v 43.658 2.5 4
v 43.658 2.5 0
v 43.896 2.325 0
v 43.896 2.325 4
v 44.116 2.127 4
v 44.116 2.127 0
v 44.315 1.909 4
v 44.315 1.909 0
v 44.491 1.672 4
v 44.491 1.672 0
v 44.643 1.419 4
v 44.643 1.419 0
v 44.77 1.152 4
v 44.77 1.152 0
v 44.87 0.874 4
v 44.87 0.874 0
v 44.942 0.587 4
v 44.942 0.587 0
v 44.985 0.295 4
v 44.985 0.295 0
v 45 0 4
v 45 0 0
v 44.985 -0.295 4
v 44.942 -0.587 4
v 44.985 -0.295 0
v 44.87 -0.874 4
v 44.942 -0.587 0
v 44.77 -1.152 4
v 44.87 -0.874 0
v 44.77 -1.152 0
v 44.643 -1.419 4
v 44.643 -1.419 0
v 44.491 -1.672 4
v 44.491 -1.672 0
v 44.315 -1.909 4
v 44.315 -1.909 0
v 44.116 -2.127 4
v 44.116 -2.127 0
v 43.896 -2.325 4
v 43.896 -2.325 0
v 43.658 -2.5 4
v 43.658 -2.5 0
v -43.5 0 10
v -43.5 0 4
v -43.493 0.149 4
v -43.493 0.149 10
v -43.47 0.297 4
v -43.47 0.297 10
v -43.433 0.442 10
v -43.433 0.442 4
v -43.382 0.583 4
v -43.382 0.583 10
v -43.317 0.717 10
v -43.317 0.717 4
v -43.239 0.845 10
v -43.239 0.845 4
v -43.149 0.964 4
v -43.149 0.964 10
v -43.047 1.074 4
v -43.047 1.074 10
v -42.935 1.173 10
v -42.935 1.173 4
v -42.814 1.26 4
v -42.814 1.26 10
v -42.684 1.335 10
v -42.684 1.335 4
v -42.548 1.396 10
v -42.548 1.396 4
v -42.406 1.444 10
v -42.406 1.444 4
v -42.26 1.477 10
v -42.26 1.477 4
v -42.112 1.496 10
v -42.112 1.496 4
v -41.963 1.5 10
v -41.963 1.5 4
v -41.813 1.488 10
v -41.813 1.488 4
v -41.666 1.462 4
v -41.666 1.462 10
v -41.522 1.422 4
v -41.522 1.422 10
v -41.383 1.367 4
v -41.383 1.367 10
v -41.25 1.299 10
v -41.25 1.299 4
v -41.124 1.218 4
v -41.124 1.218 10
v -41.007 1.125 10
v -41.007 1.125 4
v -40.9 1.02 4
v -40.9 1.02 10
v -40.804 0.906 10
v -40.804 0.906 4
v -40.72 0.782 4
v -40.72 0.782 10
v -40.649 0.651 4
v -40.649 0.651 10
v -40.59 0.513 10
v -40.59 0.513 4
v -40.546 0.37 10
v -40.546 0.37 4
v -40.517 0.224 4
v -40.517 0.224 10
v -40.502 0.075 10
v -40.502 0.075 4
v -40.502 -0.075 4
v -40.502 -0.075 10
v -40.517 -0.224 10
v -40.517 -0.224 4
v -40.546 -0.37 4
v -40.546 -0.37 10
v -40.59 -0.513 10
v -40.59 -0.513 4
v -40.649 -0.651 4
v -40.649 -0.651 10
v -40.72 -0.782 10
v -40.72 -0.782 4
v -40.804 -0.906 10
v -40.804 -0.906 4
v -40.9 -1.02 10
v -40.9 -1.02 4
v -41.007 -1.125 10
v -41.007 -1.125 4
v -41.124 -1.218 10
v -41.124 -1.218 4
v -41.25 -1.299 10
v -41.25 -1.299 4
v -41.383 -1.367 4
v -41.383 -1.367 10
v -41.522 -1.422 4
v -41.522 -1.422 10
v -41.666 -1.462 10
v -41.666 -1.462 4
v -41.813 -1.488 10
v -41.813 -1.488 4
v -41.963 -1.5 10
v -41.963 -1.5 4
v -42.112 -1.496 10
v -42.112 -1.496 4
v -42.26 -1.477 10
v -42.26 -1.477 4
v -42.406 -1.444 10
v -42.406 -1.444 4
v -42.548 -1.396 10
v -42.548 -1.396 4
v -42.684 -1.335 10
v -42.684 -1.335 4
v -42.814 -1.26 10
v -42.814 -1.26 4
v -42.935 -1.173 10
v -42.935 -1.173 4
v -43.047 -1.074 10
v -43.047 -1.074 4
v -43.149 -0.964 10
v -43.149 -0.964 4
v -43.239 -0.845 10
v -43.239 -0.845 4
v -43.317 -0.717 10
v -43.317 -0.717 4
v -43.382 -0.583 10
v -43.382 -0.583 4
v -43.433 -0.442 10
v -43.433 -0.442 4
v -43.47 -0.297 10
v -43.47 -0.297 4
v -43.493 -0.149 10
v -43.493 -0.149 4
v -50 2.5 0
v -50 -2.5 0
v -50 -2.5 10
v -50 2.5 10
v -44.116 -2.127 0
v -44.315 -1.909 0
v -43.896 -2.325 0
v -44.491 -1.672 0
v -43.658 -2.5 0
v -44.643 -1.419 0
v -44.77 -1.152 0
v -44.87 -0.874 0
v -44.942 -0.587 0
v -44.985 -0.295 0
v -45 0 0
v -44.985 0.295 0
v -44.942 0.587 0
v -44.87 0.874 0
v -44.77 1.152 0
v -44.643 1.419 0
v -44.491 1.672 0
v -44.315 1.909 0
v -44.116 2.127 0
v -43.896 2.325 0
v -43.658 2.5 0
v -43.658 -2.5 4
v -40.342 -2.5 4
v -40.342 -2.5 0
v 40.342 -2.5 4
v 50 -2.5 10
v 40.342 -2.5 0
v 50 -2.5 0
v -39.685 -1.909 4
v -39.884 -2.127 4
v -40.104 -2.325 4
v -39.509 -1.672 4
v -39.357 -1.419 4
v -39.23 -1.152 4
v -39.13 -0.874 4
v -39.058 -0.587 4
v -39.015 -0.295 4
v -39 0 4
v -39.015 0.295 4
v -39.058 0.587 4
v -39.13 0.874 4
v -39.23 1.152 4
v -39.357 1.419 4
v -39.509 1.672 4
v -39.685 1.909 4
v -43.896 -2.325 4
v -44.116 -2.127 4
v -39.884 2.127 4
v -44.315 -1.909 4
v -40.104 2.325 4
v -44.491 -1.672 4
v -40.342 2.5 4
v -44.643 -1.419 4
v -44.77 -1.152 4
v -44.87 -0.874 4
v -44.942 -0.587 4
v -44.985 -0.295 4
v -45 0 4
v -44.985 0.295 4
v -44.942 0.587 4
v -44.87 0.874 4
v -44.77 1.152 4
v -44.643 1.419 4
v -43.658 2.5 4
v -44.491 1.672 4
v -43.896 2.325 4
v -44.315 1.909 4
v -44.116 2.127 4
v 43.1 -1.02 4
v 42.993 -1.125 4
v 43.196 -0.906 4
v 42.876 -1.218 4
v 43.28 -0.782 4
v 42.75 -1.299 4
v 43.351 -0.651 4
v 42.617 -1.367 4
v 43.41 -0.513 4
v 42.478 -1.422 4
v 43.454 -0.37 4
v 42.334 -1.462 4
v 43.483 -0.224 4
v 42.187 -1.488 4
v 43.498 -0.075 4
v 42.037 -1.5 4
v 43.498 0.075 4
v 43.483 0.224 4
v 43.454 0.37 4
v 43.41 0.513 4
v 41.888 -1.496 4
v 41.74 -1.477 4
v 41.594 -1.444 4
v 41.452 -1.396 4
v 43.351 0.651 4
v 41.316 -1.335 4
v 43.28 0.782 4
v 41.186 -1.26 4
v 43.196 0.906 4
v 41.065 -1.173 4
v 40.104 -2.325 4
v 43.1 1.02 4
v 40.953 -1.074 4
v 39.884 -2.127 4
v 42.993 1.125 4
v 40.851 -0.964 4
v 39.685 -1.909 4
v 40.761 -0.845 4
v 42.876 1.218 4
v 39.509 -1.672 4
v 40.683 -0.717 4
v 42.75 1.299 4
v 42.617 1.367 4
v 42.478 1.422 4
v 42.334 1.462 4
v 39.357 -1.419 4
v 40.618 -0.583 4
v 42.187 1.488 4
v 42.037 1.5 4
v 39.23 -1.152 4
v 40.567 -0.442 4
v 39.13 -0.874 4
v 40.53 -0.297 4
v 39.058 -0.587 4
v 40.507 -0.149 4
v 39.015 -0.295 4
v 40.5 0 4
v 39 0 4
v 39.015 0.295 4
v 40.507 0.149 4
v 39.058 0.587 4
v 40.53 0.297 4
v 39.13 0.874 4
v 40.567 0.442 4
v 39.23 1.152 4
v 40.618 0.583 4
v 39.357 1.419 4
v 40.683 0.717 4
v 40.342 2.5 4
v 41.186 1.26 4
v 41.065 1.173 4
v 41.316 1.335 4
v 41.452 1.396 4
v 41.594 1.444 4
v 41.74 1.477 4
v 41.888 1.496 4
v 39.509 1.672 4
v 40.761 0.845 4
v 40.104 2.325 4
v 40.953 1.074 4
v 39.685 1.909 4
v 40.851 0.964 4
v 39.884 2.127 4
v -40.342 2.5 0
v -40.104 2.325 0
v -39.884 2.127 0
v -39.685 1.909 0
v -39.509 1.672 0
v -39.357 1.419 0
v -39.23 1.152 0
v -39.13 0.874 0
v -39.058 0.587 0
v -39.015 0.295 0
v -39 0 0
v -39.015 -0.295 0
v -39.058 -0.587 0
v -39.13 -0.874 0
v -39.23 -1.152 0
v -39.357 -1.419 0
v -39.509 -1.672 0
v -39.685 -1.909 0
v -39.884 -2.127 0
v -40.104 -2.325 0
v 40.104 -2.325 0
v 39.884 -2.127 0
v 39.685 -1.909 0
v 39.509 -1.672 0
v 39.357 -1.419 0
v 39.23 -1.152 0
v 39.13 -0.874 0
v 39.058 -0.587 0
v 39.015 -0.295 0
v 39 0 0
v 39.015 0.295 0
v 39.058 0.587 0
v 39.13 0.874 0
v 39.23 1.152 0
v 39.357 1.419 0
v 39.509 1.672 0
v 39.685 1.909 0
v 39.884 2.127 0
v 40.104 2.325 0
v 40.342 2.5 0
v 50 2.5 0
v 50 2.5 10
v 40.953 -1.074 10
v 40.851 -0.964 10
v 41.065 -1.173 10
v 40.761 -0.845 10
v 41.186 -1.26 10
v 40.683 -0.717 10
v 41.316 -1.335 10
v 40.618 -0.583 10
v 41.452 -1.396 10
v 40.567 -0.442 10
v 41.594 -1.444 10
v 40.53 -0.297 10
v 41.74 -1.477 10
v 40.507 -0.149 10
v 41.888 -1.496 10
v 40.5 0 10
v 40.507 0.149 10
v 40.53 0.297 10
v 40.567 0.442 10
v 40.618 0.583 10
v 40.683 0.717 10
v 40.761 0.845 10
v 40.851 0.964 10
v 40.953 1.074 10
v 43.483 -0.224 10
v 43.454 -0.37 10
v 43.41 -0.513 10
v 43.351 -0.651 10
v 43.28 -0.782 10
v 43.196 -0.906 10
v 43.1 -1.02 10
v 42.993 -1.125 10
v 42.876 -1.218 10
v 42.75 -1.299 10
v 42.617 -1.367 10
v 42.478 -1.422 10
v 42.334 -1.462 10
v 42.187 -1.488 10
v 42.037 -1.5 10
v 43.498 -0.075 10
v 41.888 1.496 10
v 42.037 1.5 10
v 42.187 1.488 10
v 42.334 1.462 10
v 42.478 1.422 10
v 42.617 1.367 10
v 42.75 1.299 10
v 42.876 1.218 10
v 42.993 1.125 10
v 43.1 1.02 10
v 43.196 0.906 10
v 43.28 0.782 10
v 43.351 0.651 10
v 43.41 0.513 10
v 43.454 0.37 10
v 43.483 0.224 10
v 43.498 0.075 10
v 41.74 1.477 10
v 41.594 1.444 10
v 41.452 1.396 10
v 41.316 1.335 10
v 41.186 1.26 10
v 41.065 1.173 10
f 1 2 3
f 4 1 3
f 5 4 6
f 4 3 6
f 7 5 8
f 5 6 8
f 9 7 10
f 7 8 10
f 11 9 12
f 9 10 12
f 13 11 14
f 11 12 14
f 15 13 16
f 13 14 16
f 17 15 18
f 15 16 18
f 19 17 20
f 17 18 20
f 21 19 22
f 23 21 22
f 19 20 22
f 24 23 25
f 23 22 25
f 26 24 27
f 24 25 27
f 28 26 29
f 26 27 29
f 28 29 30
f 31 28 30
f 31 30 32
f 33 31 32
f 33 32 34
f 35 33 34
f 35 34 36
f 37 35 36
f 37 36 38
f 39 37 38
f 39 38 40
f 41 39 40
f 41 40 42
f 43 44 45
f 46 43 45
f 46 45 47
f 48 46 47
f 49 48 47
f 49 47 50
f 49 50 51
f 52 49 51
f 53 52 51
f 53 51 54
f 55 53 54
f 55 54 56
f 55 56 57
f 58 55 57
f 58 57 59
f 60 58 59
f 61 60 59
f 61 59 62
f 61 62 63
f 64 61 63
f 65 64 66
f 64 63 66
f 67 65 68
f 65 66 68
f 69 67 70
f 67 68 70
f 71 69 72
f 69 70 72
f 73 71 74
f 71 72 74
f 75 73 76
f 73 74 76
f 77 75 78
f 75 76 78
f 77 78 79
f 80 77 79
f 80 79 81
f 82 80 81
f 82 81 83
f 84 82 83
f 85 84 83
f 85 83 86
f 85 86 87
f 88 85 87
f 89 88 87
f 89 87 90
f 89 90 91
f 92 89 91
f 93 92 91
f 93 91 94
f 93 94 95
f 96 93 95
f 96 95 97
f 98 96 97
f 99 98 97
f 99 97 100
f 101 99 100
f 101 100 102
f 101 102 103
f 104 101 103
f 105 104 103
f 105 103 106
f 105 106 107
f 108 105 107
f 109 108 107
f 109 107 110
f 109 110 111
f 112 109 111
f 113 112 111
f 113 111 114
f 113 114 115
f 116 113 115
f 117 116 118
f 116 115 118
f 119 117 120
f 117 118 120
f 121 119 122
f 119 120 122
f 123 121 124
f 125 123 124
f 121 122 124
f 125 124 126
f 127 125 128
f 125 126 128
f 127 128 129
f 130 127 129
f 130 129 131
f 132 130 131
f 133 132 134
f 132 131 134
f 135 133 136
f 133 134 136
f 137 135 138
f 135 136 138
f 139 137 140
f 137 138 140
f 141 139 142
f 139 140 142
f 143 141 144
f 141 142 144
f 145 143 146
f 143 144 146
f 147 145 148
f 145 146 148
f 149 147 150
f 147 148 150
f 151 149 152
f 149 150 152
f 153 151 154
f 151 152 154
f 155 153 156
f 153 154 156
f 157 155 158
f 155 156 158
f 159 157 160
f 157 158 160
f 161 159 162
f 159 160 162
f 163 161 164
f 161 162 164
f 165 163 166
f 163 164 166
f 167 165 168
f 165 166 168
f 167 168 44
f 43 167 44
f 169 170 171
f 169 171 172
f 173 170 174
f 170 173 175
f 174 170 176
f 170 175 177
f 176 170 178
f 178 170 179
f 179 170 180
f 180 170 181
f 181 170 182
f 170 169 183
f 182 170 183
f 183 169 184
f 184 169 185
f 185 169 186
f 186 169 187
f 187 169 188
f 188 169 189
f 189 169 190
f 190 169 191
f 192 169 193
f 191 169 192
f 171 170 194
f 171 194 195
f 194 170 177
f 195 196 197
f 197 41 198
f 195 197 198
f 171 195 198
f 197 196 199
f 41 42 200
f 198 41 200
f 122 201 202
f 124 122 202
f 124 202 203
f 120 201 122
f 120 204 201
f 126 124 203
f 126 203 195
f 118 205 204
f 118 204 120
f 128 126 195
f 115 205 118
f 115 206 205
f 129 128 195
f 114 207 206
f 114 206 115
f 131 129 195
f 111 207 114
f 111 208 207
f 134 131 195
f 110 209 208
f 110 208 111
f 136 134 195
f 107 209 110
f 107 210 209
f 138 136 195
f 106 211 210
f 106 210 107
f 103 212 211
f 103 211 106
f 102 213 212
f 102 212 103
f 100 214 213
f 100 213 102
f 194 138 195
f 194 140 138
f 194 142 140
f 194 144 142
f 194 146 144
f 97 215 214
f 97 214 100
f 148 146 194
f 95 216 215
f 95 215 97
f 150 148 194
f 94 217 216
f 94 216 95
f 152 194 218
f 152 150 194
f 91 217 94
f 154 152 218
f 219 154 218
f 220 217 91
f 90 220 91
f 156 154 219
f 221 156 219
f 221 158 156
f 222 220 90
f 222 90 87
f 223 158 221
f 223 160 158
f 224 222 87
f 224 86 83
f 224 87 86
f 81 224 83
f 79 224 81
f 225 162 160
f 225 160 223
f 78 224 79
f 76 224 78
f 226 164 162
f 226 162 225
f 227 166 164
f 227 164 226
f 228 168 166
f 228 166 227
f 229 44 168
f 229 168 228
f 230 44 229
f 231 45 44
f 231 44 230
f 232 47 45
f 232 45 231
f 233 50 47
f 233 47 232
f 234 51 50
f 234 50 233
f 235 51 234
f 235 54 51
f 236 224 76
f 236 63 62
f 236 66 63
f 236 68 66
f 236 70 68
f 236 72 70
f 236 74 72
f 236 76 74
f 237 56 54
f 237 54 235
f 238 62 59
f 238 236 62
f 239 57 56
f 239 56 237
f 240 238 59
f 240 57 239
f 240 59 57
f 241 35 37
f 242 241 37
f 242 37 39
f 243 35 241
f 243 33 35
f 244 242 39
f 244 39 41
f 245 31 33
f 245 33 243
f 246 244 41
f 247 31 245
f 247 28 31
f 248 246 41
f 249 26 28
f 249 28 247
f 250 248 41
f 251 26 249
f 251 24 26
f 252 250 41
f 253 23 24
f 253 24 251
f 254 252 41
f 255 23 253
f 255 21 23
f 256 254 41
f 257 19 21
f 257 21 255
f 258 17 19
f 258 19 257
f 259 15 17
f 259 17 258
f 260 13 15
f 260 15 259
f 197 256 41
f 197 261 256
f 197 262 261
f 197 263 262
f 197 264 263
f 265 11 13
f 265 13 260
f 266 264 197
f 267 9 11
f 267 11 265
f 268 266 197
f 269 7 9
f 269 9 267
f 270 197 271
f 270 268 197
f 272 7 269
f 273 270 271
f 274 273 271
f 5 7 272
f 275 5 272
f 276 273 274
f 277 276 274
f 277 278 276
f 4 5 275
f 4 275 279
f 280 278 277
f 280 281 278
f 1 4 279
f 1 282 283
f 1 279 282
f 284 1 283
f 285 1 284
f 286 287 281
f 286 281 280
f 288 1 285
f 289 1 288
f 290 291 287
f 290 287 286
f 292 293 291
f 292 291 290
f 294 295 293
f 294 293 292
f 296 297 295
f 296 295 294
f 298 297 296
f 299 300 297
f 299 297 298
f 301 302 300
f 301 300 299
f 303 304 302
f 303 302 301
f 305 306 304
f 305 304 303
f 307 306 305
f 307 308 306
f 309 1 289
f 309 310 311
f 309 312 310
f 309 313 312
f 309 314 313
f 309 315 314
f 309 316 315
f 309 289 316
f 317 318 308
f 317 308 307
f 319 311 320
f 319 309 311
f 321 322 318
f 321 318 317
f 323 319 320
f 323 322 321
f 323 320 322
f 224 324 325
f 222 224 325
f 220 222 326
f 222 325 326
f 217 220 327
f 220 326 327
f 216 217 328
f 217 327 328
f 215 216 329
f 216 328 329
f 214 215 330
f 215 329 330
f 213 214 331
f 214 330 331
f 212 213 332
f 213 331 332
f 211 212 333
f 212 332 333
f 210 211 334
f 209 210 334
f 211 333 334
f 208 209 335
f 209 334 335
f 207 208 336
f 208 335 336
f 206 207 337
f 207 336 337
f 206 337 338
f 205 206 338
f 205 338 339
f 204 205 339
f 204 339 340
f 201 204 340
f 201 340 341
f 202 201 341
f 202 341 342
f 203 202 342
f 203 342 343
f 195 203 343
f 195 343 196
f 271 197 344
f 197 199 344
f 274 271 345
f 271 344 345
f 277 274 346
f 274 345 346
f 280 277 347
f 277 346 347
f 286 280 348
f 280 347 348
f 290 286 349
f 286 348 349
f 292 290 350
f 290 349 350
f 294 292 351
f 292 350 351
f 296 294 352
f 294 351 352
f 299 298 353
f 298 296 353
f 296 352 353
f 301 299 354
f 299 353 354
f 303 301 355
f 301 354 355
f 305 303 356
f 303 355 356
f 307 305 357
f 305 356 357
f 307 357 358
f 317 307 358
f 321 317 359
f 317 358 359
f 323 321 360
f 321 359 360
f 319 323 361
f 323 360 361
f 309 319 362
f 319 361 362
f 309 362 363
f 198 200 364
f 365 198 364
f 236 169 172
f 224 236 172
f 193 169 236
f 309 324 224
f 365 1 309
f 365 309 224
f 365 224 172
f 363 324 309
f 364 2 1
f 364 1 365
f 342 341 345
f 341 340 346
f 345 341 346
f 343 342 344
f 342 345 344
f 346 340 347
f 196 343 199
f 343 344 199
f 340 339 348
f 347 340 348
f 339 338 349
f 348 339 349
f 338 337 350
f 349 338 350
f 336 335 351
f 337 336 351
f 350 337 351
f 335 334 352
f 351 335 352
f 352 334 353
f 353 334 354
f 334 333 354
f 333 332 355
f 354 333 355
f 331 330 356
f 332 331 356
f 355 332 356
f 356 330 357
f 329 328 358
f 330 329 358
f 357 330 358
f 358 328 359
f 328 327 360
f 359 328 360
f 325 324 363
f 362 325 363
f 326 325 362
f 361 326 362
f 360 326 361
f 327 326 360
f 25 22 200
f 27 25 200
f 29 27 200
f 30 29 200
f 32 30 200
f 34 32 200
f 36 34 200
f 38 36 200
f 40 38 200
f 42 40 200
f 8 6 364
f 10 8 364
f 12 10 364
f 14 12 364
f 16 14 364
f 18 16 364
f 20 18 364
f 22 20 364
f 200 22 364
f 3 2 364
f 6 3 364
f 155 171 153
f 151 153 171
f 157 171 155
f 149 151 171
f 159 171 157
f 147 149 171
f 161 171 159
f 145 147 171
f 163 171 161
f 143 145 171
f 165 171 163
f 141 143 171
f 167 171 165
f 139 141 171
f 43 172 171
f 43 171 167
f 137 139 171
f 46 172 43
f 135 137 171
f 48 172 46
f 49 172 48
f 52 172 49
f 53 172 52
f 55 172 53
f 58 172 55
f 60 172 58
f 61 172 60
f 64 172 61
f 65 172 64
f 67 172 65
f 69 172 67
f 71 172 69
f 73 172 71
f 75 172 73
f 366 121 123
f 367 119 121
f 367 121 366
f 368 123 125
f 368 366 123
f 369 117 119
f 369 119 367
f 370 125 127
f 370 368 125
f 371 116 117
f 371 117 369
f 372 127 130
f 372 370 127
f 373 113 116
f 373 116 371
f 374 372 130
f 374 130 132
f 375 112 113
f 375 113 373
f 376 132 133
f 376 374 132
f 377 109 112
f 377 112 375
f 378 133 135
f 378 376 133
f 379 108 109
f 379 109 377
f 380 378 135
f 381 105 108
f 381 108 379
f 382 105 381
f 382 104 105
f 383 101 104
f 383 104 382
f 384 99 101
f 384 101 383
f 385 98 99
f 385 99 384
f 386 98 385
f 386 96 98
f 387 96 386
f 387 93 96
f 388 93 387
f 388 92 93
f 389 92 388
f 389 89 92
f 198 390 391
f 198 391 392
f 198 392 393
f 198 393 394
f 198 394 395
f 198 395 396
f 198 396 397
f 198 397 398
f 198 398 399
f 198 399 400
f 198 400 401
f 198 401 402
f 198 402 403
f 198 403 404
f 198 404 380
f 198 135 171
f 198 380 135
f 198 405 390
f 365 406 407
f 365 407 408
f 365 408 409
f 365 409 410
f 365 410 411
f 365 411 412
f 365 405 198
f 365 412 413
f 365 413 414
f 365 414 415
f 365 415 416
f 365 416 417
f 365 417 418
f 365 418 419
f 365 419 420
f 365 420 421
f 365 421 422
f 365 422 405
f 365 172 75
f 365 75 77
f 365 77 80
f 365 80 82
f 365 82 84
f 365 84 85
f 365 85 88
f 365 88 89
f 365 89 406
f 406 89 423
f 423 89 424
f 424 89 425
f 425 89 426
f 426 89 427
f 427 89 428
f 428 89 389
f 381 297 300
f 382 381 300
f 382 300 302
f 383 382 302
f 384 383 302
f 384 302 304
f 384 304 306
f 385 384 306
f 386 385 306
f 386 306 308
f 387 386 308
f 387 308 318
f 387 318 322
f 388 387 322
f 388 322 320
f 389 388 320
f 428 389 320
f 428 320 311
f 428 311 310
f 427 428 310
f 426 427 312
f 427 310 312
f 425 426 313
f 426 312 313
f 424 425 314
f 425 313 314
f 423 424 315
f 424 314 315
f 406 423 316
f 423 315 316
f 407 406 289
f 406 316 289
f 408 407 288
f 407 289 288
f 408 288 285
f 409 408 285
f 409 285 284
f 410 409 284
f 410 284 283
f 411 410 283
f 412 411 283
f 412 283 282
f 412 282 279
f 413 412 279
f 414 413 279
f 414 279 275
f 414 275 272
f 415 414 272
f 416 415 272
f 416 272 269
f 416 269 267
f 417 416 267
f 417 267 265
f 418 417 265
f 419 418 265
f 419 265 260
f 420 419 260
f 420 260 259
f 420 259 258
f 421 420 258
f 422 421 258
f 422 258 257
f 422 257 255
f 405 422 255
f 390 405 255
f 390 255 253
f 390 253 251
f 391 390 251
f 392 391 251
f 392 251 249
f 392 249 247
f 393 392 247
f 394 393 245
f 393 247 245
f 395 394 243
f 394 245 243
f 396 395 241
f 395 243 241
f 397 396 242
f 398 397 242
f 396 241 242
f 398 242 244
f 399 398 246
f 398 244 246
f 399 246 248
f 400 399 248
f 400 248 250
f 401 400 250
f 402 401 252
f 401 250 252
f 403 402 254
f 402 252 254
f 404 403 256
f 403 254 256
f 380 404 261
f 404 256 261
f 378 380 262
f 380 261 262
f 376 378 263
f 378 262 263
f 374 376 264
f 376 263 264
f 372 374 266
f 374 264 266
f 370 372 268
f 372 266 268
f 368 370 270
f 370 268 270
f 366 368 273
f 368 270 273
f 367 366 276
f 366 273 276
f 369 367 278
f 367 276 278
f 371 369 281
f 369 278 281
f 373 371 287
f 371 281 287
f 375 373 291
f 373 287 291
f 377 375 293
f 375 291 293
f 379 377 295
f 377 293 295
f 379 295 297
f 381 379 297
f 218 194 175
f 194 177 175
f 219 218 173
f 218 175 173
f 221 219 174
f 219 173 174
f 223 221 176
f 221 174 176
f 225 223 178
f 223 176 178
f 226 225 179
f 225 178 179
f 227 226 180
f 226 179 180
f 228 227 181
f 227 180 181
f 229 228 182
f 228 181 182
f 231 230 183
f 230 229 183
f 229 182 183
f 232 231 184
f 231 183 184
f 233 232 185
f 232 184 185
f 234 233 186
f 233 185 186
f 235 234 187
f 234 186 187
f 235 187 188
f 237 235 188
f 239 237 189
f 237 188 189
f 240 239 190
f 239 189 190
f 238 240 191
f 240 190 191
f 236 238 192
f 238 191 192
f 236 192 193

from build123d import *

# Parameters (mm, degrees)
SKETCH1_W           = 100
SKETCH1_H           = 5
BOSS_EXTRUDE1_DEPTH = 10
SKETCH2_R           = 3
CUT_EXTRUDE3_DEPTH  = 4
SKETCH3_R           = 1.5
CUT_EXTRUDE4_DEPTH  = 7


with BuildPart() as part:
    # Sketch1 → Boss-Extrude1 (new body)
    with BuildSketch(Plane.XY):
        Rectangle(SKETCH1_W, SKETCH1_H)
    extrude(amount=BOSS_EXTRUDE1_DEPTH)

    # Sketch2 → Cut-Extrude3 (cut)
    with BuildSketch(Plane(origin=(0, 0, 0), x_dir=(-1, 0, 0), z_dir=(0, 0, -1))):
        with Locations((-42, 0)):
            Circle(SKETCH2_R)
        with Locations((42, 0)):
            Circle(SKETCH2_R)
    extrude(amount=-CUT_EXTRUDE3_DEPTH, mode=Mode.SUBTRACT)

    # Sketch3 → Cut-Extrude4 (cut, through all)
    with BuildSketch(Plane(origin=(0, 0, 4), x_dir=(-1, 0, 0), z_dir=(0, 0, -1))):
        with Locations((-42, 0)):
            Circle(SKETCH3_R)
        with Locations((42, 0)):
            Circle(SKETCH3_R)
    extrude(amount=-CUT_EXTRUDE4_DEPTH, mode=Mode.SUBTRACT)


solid = part.part
